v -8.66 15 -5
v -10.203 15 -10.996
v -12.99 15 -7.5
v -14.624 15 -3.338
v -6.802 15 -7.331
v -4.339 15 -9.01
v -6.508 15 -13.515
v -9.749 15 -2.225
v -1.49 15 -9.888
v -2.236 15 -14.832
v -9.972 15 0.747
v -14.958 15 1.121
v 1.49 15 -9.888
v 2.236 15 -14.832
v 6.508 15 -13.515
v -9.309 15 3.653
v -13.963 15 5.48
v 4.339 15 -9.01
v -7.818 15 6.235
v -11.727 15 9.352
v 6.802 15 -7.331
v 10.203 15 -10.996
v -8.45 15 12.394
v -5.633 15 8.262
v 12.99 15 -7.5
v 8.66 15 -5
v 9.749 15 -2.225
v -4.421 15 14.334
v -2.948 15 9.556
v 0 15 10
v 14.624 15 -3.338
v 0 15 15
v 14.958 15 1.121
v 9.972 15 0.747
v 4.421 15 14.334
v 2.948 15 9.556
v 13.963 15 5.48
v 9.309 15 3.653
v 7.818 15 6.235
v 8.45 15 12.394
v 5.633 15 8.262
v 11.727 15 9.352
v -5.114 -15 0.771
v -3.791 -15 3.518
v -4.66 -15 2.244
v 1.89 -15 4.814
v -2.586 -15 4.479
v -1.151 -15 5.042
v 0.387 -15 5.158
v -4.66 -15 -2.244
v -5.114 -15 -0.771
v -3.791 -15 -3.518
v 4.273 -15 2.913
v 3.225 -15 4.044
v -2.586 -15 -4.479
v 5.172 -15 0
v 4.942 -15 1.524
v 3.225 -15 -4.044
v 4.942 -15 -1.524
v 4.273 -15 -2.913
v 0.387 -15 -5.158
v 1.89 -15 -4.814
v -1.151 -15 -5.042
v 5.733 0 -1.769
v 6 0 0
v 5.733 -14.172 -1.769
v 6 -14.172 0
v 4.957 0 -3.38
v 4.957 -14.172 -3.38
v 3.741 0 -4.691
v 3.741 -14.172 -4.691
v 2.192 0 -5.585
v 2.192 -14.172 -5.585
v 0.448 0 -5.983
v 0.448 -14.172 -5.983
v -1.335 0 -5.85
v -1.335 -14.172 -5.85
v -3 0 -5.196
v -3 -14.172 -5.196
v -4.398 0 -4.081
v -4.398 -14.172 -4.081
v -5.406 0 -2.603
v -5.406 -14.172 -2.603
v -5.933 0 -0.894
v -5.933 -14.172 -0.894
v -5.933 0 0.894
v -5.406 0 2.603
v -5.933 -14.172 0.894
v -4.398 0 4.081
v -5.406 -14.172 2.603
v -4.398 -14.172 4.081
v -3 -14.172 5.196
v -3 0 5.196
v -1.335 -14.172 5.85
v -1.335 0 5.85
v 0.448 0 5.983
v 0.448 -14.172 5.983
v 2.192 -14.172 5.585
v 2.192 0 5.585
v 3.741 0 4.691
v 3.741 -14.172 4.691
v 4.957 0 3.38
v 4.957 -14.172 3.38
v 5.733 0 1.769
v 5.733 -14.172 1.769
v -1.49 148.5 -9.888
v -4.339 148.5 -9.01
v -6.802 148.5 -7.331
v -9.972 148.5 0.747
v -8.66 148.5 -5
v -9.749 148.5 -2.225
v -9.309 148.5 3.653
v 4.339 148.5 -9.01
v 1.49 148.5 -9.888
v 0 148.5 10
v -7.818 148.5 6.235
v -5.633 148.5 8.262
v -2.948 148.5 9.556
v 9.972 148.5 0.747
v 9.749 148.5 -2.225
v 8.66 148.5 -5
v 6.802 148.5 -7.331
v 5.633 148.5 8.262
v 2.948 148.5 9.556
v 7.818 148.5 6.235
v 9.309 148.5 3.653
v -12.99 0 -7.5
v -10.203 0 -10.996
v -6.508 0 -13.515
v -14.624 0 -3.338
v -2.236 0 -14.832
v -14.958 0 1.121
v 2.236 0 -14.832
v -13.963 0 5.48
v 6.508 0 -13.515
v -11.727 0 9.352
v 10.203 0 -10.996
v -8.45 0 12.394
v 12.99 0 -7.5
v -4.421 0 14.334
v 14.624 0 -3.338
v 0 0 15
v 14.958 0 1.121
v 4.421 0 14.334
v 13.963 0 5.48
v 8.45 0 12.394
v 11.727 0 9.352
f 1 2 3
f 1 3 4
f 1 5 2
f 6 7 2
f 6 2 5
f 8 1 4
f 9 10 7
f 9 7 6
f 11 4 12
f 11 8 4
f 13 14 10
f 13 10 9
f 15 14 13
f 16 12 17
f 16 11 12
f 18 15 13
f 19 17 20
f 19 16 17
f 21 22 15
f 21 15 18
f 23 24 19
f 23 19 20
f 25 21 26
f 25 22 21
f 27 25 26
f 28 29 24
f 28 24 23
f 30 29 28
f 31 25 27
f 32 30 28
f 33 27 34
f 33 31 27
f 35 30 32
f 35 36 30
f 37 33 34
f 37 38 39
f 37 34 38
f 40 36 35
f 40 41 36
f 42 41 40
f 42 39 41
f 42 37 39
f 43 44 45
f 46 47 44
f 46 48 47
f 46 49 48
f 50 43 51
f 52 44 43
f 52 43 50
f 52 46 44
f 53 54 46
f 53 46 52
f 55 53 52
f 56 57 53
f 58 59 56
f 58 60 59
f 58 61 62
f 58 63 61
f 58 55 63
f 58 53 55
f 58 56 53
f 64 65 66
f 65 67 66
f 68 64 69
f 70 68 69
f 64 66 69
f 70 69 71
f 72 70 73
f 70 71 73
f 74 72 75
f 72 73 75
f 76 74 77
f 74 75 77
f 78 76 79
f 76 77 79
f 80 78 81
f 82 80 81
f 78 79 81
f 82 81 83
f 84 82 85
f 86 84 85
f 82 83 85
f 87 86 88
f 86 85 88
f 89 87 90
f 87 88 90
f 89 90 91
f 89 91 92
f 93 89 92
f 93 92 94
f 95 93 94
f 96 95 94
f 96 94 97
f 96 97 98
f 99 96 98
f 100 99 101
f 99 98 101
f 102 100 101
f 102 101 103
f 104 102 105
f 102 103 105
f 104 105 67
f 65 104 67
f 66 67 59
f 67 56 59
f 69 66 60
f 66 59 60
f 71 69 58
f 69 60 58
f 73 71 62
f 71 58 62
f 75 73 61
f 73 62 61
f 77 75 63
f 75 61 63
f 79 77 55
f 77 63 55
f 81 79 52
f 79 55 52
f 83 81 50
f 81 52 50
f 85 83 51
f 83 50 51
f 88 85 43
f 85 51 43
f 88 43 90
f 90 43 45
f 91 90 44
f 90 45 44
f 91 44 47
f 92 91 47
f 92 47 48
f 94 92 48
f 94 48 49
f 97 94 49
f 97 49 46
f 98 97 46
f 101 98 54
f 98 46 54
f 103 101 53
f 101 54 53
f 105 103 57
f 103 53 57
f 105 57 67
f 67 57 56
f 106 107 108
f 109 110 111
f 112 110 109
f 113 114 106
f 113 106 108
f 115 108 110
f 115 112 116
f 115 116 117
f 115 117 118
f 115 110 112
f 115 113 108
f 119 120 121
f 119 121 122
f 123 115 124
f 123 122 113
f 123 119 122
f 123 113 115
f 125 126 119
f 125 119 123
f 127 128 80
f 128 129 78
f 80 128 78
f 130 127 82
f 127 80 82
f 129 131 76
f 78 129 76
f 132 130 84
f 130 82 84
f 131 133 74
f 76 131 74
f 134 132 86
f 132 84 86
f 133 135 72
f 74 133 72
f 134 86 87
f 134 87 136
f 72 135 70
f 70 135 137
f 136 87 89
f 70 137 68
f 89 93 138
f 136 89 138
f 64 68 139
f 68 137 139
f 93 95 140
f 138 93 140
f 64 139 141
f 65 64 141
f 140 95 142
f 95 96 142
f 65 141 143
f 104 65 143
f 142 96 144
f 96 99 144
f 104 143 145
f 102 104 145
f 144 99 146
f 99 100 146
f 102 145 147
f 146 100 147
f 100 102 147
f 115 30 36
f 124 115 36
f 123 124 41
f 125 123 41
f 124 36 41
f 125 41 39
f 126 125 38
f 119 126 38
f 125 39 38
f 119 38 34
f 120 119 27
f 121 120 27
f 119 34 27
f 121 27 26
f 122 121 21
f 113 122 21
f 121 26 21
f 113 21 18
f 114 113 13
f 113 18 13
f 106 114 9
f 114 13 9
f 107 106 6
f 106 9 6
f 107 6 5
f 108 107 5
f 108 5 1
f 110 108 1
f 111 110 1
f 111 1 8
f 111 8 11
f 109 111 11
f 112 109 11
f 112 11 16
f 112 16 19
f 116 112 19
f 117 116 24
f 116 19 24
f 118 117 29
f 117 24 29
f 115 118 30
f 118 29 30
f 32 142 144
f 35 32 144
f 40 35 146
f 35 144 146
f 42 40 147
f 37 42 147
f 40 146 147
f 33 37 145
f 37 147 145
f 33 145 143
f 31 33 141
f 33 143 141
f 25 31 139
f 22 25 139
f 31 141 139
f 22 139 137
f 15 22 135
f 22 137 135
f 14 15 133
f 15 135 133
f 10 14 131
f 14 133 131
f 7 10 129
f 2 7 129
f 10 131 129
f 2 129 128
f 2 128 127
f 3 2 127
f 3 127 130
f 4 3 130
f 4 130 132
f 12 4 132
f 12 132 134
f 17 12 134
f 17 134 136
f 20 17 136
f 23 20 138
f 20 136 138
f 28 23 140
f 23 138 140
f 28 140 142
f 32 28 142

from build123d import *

# Parameters (mm, degrees)
SKETCH1_R           = 15
BOSS_EXTRUDE1_DEPTH = 15
SKETCH2_R           = 10
BOSS_EXTRUDE2_DEPTH = 133.5
SKETCH4_R           = 7.5
BOSS_EXTRUDE3_DEPTH = 15


# Read off the part's stored shape, not the designer's step: M12x1.5 Machine Threads Stud1
with BuildPart() as part:
    # Sketch1 → Boss-Extrude1 (new body)
    with BuildSketch(Plane(origin=(0, 0, 0), x_dir=(1, 0, 0), z_dir=(0, 1, 0))):
        with Locations(Location((0, 0, 0), (0, 0, 270))):
            Circle(SKETCH1_R)
    extrude(amount=BOSS_EXTRUDE1_DEPTH)

    # Sketch2 → Boss-Extrude2 (add)
    with BuildSketch(Plane(origin=(0, 15, 0), x_dir=(1, 0, 0), z_dir=(0, 1, 0))):
        with Locations(Location((0, 0, 0), (0, 0, 270))):
            Circle(SKETCH2_R)
    extrude(amount=BOSS_EXTRUDE2_DEPTH)

    # Sketch4 → Boss-Extrude3 (add)
    with BuildSketch(Plane.XZ):
        with Locations(Location((0, 0, 0), (0, 0, 270))):
            Circle(SKETCH4_R)
    extrude(amount=BOSS_EXTRUDE3_DEPTH)

    # M12x1.5 Machine Threads Stud1 outline → M12x1.5 Machine Threads Stud1 (revolve, cut)
    with BuildSketch(Plane.XY):
        Polygon((7.5, 0), (6, 0), (6, -14.172), (5.172, -15), (7.5, -15), align=None)
    revolve(axis=Axis((0, 0, 0), (0, 1, 0)), mode=Mode.SUBTRACT)


solid = part.part
